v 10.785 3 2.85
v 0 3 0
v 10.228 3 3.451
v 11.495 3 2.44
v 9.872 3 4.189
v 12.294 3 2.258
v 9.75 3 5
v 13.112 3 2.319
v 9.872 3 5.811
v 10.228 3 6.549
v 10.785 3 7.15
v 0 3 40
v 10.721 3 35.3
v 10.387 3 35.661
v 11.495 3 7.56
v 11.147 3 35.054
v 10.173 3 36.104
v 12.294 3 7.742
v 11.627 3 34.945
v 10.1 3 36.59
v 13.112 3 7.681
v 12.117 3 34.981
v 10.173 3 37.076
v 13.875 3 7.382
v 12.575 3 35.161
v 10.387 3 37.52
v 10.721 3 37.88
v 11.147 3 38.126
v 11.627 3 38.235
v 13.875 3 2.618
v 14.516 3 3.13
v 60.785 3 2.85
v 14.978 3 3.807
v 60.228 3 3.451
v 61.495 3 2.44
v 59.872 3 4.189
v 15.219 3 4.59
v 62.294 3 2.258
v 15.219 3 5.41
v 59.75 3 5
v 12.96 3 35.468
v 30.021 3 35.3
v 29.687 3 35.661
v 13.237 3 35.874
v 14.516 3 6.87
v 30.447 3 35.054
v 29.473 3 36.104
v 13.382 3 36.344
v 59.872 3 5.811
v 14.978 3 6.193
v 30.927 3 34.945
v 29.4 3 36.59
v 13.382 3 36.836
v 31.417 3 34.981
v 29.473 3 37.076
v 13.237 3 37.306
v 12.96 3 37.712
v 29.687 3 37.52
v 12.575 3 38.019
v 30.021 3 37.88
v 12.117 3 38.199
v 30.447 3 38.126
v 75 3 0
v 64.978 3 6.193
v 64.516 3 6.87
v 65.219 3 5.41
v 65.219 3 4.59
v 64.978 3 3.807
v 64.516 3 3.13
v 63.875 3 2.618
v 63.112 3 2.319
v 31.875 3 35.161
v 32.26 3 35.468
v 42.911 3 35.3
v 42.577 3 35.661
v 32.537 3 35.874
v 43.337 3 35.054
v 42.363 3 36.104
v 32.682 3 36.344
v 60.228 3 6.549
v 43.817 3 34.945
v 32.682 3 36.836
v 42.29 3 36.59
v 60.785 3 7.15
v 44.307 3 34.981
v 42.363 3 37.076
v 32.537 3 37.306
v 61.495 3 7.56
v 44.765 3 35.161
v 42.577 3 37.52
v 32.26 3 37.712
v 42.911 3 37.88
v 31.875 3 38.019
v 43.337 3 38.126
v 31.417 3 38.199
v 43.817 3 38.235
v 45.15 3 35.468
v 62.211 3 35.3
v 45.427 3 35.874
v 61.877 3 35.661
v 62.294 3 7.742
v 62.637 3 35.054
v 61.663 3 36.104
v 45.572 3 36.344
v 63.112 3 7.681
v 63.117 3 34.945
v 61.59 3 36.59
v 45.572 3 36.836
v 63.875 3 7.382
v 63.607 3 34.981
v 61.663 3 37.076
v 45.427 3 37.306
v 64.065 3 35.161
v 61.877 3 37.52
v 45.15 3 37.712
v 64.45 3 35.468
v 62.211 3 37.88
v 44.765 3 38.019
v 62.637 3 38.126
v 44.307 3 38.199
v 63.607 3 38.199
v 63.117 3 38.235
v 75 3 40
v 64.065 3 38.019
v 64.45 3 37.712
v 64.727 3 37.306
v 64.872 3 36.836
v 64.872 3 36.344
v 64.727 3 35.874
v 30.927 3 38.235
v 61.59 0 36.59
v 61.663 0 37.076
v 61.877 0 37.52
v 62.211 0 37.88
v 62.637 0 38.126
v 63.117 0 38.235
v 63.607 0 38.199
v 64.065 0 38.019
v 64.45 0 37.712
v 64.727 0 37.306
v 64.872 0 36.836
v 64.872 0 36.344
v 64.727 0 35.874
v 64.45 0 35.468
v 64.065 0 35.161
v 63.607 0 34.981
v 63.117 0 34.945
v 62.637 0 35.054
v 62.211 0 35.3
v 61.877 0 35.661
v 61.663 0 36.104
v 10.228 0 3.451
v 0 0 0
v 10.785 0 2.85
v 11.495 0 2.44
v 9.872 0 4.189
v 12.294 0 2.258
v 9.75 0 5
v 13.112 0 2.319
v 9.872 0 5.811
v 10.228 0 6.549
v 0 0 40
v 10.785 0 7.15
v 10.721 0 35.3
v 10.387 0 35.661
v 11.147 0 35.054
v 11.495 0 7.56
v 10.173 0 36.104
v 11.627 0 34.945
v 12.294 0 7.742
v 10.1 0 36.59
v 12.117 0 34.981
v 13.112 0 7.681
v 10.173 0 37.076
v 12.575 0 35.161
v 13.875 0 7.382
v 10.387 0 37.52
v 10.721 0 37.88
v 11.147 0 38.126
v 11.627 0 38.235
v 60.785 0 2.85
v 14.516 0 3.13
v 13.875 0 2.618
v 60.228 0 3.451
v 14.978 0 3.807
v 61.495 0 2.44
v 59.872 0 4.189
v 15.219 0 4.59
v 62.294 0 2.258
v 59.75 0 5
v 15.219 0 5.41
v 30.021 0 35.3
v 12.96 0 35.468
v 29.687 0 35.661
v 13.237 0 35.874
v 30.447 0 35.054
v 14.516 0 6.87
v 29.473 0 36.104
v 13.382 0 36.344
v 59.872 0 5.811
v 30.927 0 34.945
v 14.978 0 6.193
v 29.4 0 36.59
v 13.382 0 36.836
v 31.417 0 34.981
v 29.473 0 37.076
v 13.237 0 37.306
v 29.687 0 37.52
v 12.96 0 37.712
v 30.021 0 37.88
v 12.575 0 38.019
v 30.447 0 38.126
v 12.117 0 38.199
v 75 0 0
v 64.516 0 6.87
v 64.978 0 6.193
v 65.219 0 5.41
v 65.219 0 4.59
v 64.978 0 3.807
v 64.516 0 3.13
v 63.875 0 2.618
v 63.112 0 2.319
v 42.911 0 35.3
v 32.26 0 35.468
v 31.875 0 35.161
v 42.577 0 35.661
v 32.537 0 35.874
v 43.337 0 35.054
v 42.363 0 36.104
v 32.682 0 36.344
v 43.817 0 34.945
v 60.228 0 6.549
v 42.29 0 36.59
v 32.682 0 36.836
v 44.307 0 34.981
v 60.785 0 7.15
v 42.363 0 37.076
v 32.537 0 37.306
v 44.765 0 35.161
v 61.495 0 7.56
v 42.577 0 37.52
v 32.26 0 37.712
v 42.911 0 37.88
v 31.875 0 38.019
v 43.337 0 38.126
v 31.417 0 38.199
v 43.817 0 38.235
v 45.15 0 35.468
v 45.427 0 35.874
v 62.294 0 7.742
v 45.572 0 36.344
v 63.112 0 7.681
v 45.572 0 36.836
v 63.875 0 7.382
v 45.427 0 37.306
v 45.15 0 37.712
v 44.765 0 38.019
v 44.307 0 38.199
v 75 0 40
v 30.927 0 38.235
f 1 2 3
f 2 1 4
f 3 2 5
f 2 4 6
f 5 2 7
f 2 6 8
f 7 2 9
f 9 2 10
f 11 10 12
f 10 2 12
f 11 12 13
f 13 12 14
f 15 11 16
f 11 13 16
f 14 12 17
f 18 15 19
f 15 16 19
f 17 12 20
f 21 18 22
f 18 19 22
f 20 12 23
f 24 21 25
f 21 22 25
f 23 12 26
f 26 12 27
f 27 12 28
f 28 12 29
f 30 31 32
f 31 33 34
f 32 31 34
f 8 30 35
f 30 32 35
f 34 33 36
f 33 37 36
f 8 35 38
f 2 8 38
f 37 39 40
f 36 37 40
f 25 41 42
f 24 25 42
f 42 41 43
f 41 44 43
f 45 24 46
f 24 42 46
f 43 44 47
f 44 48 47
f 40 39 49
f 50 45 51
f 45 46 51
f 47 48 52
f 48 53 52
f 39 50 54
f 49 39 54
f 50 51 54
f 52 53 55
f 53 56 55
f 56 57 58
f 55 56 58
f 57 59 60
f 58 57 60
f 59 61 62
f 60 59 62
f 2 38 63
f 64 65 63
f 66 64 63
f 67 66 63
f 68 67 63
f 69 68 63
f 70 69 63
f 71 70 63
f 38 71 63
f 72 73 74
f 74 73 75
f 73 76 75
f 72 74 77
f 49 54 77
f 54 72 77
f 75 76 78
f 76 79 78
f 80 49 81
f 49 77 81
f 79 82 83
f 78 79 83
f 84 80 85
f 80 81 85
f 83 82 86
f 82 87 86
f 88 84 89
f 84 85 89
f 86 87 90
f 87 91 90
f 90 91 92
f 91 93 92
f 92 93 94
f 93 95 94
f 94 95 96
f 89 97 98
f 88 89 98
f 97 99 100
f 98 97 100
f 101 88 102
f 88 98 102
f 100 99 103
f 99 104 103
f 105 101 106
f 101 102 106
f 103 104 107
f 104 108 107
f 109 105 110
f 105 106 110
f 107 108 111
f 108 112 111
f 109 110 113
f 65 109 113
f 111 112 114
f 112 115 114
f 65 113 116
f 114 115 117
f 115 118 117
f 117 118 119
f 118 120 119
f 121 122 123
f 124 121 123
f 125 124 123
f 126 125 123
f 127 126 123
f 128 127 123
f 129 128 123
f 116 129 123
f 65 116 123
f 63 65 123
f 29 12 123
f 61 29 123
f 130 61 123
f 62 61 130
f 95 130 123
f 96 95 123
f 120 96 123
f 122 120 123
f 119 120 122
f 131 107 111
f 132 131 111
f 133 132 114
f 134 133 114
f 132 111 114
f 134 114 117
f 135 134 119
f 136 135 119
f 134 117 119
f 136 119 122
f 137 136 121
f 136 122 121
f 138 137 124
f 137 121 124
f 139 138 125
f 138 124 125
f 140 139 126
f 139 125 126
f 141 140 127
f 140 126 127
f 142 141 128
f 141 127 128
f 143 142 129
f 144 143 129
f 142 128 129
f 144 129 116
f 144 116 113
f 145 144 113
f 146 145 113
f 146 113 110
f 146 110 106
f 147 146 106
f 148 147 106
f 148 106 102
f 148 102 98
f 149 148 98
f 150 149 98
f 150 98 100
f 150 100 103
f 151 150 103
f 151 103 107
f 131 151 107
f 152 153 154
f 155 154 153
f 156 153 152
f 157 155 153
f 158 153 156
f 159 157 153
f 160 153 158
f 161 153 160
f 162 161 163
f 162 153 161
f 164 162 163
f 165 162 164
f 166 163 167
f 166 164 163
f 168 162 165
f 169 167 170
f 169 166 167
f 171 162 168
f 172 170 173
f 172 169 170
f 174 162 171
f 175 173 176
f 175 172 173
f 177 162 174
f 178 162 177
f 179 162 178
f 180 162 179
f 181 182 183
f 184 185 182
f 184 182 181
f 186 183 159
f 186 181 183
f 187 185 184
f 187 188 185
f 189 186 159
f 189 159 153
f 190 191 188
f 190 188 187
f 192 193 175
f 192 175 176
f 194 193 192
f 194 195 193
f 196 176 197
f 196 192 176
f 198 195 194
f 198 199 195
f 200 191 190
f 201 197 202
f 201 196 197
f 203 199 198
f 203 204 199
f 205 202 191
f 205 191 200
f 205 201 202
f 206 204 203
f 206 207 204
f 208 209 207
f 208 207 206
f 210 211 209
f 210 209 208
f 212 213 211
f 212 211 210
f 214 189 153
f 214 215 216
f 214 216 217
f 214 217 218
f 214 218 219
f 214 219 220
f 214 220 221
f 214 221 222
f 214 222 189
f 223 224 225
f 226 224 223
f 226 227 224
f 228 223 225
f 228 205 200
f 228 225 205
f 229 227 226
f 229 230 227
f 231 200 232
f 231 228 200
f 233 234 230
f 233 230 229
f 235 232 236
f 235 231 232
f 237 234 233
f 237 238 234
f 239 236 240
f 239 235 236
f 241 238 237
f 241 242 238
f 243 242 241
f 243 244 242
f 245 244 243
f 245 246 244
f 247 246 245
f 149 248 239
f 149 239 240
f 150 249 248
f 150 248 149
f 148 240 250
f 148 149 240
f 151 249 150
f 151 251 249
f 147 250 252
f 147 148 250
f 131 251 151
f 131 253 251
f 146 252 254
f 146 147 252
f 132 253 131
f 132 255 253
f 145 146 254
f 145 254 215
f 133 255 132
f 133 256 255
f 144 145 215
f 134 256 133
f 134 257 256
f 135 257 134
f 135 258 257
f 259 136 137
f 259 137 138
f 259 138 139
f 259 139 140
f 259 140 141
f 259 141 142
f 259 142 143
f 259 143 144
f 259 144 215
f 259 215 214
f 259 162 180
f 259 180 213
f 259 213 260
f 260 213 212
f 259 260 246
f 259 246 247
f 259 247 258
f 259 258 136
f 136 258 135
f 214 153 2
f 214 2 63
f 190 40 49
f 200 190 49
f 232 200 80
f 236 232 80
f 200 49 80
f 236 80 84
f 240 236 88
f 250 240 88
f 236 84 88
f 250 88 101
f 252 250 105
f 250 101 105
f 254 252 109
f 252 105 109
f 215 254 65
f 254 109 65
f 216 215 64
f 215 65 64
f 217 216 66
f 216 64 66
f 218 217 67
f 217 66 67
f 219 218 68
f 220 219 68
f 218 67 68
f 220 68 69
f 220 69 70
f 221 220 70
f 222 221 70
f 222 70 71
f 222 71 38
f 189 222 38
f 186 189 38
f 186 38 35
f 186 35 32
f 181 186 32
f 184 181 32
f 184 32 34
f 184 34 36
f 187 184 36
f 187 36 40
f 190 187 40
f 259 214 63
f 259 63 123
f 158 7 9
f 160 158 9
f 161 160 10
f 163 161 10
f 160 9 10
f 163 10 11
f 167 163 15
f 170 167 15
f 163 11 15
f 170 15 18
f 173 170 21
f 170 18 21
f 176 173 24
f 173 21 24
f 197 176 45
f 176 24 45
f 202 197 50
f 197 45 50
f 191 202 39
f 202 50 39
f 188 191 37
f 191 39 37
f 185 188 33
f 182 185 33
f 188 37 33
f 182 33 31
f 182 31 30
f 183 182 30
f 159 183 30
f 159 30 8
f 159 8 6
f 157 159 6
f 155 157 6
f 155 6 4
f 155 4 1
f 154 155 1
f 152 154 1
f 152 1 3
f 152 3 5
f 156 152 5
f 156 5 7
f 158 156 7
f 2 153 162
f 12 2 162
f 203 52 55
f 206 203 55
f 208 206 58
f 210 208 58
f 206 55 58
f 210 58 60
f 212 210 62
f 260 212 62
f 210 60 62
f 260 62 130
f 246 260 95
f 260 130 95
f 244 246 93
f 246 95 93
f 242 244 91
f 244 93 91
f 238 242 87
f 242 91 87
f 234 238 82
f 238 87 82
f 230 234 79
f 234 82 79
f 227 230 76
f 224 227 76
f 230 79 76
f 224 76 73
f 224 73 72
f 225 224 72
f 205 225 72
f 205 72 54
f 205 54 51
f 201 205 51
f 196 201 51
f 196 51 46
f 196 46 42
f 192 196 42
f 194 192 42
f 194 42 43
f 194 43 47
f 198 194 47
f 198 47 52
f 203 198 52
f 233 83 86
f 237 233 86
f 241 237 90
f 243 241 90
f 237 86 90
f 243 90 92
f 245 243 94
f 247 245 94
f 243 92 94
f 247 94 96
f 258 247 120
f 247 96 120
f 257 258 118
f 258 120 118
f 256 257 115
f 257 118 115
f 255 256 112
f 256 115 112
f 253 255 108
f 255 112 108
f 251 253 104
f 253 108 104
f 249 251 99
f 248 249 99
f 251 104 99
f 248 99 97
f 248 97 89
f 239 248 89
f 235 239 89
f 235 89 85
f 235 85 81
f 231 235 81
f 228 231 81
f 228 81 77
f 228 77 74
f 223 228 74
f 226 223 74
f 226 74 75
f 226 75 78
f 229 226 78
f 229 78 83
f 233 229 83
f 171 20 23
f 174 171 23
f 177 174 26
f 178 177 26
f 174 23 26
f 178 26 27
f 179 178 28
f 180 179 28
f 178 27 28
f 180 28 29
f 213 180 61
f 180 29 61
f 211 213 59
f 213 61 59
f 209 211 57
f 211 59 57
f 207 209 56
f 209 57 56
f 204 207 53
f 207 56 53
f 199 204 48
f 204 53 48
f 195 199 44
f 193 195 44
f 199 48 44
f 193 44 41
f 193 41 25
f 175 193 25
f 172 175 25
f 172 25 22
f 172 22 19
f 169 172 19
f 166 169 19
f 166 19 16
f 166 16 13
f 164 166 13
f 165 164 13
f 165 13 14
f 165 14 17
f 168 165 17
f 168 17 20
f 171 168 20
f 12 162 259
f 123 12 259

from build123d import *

# Parameters (mm, degrees)
F0_W     = 75
F0_H     = 40
F1_DEPTH = 3
F3_D     = 5.5
F4_D     = 3.3


with BuildPart() as f1:
    # F0 (on Front) → F1 (new body)
    with BuildSketch(Plane.XZ):
        with Locations((37.5, 20)):
            Rectangle(F0_W, F0_H)
    extrude(amount=-F1_DEPTH)

    # F3 (through all)
    with Locations(Plane.XZ):
        with Locations((12.5, 5), (62.5, 5)):
            Hole(F3_D / 2)

    # F4 (through all)
    with Locations(Plane.XZ):
        with Locations((11.75, 36.590098), (31.05, 36.590098), (43.94, 36.590098), (63.24, 36.590098)):
            Hole(F4_D / 2)


solid = f1.part
